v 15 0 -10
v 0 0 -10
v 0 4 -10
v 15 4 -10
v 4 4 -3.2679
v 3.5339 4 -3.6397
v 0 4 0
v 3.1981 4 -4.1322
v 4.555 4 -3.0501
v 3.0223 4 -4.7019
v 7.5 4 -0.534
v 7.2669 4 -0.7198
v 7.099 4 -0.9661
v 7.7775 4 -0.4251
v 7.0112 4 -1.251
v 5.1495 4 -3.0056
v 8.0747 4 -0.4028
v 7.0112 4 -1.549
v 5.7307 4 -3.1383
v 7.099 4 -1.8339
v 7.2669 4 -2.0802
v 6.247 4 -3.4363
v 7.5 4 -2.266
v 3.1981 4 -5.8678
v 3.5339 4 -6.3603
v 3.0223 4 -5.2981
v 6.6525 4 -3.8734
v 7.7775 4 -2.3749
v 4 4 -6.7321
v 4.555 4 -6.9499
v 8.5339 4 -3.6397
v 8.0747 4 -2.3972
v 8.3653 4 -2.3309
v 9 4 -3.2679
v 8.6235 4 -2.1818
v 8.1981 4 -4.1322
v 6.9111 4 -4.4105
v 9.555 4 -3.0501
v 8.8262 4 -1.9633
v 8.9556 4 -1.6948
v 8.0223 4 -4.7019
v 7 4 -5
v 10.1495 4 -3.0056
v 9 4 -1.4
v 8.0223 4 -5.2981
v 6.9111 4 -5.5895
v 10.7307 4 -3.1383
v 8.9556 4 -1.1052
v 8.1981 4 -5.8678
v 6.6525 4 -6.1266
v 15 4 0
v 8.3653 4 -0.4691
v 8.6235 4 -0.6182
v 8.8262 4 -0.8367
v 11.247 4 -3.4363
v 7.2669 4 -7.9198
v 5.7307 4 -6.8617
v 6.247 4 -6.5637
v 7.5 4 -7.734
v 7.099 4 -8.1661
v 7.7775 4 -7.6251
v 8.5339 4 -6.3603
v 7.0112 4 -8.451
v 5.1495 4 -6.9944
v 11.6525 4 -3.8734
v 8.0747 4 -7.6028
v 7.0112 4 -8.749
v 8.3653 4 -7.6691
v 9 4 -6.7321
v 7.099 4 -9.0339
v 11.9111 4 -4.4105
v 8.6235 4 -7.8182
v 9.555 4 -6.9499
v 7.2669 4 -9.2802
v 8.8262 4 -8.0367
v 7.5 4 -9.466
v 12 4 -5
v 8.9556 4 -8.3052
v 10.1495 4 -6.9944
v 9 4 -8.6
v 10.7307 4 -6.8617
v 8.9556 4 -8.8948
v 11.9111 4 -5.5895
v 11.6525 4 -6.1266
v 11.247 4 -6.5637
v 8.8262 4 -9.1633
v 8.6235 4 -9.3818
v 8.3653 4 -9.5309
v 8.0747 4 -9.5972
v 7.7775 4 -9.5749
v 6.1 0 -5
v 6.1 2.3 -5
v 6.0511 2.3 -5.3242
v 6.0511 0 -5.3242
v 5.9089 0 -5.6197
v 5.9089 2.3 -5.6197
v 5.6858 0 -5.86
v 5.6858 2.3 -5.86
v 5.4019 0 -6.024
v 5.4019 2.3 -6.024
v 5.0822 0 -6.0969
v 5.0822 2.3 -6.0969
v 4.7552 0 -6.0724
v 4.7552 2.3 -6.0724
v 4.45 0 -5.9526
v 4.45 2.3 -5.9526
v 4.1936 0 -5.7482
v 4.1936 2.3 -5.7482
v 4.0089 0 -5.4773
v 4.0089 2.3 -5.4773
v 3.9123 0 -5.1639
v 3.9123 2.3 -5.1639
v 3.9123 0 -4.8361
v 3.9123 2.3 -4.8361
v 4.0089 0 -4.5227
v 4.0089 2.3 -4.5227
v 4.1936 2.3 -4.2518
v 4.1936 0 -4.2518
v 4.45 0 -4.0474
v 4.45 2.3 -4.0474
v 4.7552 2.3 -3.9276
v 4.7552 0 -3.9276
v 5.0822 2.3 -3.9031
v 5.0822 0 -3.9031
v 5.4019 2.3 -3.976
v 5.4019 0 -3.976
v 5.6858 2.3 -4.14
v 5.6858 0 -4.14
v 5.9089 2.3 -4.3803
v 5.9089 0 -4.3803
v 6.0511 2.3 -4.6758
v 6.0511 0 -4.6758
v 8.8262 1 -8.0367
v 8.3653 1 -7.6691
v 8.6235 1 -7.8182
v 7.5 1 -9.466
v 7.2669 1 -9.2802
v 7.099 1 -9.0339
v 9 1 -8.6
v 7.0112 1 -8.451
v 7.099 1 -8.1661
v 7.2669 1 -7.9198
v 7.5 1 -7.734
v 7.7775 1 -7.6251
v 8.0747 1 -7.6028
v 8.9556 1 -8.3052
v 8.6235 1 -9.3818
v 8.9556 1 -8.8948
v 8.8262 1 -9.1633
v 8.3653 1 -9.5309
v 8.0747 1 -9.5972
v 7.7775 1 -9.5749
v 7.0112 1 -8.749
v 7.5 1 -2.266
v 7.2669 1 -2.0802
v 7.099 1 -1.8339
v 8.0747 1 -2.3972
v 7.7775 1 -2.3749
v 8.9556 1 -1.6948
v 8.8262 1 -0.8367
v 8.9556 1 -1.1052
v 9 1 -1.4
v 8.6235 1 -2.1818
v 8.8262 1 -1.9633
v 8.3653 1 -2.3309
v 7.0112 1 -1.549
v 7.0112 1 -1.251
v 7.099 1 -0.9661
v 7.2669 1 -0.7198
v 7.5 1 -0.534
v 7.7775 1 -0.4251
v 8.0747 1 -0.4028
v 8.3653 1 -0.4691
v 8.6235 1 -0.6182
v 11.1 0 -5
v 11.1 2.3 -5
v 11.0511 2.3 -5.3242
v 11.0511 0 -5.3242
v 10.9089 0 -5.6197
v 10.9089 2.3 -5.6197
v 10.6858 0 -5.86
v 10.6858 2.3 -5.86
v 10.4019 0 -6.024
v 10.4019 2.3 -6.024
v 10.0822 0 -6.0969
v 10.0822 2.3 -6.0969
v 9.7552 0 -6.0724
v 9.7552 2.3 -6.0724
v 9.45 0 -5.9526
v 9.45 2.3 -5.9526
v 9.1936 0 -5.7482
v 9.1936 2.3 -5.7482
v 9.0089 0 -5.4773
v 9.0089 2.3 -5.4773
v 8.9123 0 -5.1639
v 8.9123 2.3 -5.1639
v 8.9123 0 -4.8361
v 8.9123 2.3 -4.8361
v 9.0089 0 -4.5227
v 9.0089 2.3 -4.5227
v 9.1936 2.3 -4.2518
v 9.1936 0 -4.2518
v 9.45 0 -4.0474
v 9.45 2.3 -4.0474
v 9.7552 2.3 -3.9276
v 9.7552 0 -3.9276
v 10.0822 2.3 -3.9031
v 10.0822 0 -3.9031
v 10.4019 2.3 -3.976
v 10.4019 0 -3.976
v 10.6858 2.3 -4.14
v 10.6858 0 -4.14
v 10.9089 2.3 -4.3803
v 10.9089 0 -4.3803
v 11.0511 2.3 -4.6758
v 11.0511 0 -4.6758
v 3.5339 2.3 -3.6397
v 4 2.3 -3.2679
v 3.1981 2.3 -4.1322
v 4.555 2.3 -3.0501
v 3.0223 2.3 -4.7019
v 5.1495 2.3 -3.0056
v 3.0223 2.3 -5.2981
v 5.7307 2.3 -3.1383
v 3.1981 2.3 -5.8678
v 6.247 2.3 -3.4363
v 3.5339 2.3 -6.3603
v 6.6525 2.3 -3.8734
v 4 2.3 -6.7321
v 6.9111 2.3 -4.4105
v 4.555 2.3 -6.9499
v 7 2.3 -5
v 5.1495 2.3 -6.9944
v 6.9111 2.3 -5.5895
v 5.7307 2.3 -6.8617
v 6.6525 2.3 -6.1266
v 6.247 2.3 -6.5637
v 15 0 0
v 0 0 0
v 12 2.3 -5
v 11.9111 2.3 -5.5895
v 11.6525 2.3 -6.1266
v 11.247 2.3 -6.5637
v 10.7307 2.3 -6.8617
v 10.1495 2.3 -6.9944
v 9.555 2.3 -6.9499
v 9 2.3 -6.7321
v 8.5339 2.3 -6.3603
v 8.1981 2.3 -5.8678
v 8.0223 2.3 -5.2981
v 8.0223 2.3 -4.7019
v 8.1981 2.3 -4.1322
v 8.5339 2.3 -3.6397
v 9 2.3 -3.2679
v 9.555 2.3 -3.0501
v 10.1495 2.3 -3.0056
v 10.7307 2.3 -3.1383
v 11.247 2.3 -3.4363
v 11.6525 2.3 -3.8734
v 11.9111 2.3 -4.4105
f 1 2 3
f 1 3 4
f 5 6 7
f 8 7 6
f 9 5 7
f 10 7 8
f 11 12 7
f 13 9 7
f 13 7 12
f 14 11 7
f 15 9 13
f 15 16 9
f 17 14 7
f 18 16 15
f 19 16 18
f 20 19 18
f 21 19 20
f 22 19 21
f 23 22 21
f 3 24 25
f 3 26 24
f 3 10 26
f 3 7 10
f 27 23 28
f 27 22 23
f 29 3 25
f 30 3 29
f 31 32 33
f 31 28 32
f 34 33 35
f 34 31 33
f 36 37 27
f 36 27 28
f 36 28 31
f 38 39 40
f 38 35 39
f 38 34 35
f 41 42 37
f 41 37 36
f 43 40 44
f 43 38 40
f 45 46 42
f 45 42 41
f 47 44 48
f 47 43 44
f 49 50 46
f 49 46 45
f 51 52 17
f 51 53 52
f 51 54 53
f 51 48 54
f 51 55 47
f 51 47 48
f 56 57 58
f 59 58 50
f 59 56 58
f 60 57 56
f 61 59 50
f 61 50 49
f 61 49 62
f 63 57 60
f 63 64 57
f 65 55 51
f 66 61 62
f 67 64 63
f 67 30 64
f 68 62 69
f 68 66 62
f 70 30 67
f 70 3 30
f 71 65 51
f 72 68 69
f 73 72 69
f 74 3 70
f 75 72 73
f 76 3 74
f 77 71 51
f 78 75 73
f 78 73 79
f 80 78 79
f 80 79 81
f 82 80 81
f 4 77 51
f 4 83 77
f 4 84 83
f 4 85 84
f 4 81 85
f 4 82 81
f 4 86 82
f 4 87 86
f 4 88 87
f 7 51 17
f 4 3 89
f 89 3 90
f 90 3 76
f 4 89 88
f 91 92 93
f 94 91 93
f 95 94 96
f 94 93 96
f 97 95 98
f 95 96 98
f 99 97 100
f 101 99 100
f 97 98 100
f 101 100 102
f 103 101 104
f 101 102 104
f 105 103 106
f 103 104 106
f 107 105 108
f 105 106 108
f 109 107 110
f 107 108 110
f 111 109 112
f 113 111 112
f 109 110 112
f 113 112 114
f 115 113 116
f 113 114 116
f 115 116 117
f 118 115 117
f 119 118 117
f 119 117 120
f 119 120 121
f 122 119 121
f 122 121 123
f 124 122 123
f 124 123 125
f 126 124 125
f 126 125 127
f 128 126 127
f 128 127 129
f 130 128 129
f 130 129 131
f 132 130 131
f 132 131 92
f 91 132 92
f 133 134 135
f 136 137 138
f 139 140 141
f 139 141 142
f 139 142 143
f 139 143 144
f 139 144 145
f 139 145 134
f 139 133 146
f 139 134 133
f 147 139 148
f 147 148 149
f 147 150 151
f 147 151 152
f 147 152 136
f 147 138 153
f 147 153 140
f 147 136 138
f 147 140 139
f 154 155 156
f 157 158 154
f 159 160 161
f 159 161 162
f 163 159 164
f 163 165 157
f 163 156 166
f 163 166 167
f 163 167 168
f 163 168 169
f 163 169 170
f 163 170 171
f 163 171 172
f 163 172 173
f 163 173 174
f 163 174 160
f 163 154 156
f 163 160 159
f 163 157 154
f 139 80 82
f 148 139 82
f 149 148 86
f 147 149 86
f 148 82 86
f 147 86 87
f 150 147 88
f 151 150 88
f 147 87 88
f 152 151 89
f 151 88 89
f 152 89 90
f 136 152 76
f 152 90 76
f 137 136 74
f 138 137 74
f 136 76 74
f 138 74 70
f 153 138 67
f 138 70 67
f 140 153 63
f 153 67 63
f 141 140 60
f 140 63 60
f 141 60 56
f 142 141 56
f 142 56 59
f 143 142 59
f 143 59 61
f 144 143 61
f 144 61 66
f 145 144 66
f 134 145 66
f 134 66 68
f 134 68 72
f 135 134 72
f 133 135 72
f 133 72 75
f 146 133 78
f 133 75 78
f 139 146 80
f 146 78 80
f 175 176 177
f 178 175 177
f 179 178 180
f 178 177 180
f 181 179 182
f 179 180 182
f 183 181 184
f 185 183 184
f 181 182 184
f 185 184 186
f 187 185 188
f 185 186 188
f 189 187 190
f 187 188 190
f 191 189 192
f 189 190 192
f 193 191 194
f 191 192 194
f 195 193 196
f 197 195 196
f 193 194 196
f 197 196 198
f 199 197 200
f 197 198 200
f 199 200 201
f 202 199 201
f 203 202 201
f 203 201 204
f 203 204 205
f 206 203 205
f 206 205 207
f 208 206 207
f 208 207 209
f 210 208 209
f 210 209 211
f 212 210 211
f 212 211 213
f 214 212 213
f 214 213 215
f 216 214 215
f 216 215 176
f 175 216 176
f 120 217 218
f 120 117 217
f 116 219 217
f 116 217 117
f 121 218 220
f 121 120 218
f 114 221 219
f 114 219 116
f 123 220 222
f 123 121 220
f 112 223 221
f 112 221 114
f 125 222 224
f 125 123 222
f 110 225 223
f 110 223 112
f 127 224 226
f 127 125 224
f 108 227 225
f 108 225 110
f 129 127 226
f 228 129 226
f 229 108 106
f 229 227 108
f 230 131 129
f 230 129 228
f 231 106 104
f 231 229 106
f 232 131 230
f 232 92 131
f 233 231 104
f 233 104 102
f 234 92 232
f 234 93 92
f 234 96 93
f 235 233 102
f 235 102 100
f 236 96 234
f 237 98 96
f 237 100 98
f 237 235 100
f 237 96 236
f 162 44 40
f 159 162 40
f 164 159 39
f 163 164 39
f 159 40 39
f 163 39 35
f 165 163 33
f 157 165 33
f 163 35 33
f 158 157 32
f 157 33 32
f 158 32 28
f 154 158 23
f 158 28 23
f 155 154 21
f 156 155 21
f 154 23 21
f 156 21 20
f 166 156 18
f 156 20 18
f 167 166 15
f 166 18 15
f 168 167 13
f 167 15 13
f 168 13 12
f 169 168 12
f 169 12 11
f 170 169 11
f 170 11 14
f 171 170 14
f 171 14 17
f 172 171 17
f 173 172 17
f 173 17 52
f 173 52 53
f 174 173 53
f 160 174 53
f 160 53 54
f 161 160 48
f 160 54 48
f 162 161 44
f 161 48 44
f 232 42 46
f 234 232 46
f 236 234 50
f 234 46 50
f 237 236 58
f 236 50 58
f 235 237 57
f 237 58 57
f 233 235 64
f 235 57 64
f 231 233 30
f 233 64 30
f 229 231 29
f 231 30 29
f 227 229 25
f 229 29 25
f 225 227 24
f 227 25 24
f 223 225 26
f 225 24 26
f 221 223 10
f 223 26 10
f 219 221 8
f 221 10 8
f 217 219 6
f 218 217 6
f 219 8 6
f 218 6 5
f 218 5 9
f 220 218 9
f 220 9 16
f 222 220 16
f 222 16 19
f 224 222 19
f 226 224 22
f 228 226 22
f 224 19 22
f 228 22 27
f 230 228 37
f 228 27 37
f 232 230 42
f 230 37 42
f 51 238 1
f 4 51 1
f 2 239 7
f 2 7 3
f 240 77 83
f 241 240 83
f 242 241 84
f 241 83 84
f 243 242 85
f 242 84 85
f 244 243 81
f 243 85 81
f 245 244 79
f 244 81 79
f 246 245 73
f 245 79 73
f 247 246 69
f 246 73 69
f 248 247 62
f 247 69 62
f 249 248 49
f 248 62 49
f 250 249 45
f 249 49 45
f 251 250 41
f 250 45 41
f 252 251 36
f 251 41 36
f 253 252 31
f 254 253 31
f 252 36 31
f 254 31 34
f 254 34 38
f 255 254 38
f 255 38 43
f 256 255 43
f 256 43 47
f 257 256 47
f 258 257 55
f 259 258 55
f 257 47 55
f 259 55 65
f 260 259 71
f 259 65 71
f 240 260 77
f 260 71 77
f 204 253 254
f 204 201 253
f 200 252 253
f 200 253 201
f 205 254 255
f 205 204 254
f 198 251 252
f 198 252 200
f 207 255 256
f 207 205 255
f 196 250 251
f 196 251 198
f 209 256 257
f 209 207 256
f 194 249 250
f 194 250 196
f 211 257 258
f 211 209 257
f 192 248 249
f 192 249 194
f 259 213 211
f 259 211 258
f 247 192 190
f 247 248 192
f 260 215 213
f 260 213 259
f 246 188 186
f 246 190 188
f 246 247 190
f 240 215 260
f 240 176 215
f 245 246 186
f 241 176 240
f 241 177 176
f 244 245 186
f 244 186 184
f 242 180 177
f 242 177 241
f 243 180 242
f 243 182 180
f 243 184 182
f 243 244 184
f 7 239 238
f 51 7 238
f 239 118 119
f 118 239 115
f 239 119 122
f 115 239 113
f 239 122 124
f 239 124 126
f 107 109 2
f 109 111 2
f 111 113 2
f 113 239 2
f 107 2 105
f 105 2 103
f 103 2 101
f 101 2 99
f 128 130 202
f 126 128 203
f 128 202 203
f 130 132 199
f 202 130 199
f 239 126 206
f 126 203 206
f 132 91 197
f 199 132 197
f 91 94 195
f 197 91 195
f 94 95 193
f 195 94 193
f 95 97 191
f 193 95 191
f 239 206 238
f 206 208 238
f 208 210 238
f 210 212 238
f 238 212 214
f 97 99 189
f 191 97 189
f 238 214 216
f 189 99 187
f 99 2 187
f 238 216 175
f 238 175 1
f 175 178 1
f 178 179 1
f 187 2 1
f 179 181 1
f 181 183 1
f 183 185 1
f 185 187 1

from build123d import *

# Parameters (mm, degrees)
SKETCH_1_W          = 15
SKETCH_1_H          = 10
EXTRUDE_1_DEPTH     = 4
SKETCH_2_R          = 1.1
CUT_EXTRUDE_1_DEPTH = 5
SKETCH_5_R          = 1
CUT_EXTRUDE_4_DEPTH = 3
SKETCH_3_R          = 2
CUT_EXTRUDE_5_DEPTH = 1.7


with BuildPart() as part:
    # 草图1 → 凸台-拉伸1 (new body)
    with BuildSketch(Plane(origin=(0, 0, 0), x_dir=(1, 0, 0), z_dir=(0, 1, 0))):
        with Locations((7.5, 5)):
            Rectangle(SKETCH_1_W, SKETCH_1_H)
    extrude(amount=EXTRUDE_1_DEPTH)

    # 草图2 → 切除-拉伸1 (cut, through all)
    with BuildSketch(Plane(origin=(0, 4, 0), x_dir=(1, 0, 0), z_dir=(0, 1, 0))):
        with Locations((5, 5)):
            Circle(SKETCH_2_R)
        with Locations((10, 5)):
            Circle(SKETCH_2_R)
    extrude(amount=-CUT_EXTRUDE_1_DEPTH, mode=Mode.SUBTRACT)

    # 草图5 → 切除-拉伸4 (cut)
    with BuildSketch(Plane(origin=(0, 4, 0), x_dir=(1, 0, 0), z_dir=(0, 1, 0))):
        with Locations((8, 8.6)):
            Circle(SKETCH_5_R)
        with Locations((8, 1.4)):
            Circle(SKETCH_5_R)
    extrude(amount=-CUT_EXTRUDE_4_DEPTH, mode=Mode.SUBTRACT)

    # 草图3 → 切除-拉伸5 (cut)
    with BuildSketch(Plane(origin=(0, 4, 0), x_dir=(1, 0, 0), z_dir=(0, 1, 0))):
        with Locations((5, 5)):
            Circle(SKETCH_3_R)
        with Locations((10, 5)):
            Circle(SKETCH_3_R)
    extrude(amount=-CUT_EXTRUDE_5_DEPTH, mode=Mode.SUBTRACT)


solid = part.part
